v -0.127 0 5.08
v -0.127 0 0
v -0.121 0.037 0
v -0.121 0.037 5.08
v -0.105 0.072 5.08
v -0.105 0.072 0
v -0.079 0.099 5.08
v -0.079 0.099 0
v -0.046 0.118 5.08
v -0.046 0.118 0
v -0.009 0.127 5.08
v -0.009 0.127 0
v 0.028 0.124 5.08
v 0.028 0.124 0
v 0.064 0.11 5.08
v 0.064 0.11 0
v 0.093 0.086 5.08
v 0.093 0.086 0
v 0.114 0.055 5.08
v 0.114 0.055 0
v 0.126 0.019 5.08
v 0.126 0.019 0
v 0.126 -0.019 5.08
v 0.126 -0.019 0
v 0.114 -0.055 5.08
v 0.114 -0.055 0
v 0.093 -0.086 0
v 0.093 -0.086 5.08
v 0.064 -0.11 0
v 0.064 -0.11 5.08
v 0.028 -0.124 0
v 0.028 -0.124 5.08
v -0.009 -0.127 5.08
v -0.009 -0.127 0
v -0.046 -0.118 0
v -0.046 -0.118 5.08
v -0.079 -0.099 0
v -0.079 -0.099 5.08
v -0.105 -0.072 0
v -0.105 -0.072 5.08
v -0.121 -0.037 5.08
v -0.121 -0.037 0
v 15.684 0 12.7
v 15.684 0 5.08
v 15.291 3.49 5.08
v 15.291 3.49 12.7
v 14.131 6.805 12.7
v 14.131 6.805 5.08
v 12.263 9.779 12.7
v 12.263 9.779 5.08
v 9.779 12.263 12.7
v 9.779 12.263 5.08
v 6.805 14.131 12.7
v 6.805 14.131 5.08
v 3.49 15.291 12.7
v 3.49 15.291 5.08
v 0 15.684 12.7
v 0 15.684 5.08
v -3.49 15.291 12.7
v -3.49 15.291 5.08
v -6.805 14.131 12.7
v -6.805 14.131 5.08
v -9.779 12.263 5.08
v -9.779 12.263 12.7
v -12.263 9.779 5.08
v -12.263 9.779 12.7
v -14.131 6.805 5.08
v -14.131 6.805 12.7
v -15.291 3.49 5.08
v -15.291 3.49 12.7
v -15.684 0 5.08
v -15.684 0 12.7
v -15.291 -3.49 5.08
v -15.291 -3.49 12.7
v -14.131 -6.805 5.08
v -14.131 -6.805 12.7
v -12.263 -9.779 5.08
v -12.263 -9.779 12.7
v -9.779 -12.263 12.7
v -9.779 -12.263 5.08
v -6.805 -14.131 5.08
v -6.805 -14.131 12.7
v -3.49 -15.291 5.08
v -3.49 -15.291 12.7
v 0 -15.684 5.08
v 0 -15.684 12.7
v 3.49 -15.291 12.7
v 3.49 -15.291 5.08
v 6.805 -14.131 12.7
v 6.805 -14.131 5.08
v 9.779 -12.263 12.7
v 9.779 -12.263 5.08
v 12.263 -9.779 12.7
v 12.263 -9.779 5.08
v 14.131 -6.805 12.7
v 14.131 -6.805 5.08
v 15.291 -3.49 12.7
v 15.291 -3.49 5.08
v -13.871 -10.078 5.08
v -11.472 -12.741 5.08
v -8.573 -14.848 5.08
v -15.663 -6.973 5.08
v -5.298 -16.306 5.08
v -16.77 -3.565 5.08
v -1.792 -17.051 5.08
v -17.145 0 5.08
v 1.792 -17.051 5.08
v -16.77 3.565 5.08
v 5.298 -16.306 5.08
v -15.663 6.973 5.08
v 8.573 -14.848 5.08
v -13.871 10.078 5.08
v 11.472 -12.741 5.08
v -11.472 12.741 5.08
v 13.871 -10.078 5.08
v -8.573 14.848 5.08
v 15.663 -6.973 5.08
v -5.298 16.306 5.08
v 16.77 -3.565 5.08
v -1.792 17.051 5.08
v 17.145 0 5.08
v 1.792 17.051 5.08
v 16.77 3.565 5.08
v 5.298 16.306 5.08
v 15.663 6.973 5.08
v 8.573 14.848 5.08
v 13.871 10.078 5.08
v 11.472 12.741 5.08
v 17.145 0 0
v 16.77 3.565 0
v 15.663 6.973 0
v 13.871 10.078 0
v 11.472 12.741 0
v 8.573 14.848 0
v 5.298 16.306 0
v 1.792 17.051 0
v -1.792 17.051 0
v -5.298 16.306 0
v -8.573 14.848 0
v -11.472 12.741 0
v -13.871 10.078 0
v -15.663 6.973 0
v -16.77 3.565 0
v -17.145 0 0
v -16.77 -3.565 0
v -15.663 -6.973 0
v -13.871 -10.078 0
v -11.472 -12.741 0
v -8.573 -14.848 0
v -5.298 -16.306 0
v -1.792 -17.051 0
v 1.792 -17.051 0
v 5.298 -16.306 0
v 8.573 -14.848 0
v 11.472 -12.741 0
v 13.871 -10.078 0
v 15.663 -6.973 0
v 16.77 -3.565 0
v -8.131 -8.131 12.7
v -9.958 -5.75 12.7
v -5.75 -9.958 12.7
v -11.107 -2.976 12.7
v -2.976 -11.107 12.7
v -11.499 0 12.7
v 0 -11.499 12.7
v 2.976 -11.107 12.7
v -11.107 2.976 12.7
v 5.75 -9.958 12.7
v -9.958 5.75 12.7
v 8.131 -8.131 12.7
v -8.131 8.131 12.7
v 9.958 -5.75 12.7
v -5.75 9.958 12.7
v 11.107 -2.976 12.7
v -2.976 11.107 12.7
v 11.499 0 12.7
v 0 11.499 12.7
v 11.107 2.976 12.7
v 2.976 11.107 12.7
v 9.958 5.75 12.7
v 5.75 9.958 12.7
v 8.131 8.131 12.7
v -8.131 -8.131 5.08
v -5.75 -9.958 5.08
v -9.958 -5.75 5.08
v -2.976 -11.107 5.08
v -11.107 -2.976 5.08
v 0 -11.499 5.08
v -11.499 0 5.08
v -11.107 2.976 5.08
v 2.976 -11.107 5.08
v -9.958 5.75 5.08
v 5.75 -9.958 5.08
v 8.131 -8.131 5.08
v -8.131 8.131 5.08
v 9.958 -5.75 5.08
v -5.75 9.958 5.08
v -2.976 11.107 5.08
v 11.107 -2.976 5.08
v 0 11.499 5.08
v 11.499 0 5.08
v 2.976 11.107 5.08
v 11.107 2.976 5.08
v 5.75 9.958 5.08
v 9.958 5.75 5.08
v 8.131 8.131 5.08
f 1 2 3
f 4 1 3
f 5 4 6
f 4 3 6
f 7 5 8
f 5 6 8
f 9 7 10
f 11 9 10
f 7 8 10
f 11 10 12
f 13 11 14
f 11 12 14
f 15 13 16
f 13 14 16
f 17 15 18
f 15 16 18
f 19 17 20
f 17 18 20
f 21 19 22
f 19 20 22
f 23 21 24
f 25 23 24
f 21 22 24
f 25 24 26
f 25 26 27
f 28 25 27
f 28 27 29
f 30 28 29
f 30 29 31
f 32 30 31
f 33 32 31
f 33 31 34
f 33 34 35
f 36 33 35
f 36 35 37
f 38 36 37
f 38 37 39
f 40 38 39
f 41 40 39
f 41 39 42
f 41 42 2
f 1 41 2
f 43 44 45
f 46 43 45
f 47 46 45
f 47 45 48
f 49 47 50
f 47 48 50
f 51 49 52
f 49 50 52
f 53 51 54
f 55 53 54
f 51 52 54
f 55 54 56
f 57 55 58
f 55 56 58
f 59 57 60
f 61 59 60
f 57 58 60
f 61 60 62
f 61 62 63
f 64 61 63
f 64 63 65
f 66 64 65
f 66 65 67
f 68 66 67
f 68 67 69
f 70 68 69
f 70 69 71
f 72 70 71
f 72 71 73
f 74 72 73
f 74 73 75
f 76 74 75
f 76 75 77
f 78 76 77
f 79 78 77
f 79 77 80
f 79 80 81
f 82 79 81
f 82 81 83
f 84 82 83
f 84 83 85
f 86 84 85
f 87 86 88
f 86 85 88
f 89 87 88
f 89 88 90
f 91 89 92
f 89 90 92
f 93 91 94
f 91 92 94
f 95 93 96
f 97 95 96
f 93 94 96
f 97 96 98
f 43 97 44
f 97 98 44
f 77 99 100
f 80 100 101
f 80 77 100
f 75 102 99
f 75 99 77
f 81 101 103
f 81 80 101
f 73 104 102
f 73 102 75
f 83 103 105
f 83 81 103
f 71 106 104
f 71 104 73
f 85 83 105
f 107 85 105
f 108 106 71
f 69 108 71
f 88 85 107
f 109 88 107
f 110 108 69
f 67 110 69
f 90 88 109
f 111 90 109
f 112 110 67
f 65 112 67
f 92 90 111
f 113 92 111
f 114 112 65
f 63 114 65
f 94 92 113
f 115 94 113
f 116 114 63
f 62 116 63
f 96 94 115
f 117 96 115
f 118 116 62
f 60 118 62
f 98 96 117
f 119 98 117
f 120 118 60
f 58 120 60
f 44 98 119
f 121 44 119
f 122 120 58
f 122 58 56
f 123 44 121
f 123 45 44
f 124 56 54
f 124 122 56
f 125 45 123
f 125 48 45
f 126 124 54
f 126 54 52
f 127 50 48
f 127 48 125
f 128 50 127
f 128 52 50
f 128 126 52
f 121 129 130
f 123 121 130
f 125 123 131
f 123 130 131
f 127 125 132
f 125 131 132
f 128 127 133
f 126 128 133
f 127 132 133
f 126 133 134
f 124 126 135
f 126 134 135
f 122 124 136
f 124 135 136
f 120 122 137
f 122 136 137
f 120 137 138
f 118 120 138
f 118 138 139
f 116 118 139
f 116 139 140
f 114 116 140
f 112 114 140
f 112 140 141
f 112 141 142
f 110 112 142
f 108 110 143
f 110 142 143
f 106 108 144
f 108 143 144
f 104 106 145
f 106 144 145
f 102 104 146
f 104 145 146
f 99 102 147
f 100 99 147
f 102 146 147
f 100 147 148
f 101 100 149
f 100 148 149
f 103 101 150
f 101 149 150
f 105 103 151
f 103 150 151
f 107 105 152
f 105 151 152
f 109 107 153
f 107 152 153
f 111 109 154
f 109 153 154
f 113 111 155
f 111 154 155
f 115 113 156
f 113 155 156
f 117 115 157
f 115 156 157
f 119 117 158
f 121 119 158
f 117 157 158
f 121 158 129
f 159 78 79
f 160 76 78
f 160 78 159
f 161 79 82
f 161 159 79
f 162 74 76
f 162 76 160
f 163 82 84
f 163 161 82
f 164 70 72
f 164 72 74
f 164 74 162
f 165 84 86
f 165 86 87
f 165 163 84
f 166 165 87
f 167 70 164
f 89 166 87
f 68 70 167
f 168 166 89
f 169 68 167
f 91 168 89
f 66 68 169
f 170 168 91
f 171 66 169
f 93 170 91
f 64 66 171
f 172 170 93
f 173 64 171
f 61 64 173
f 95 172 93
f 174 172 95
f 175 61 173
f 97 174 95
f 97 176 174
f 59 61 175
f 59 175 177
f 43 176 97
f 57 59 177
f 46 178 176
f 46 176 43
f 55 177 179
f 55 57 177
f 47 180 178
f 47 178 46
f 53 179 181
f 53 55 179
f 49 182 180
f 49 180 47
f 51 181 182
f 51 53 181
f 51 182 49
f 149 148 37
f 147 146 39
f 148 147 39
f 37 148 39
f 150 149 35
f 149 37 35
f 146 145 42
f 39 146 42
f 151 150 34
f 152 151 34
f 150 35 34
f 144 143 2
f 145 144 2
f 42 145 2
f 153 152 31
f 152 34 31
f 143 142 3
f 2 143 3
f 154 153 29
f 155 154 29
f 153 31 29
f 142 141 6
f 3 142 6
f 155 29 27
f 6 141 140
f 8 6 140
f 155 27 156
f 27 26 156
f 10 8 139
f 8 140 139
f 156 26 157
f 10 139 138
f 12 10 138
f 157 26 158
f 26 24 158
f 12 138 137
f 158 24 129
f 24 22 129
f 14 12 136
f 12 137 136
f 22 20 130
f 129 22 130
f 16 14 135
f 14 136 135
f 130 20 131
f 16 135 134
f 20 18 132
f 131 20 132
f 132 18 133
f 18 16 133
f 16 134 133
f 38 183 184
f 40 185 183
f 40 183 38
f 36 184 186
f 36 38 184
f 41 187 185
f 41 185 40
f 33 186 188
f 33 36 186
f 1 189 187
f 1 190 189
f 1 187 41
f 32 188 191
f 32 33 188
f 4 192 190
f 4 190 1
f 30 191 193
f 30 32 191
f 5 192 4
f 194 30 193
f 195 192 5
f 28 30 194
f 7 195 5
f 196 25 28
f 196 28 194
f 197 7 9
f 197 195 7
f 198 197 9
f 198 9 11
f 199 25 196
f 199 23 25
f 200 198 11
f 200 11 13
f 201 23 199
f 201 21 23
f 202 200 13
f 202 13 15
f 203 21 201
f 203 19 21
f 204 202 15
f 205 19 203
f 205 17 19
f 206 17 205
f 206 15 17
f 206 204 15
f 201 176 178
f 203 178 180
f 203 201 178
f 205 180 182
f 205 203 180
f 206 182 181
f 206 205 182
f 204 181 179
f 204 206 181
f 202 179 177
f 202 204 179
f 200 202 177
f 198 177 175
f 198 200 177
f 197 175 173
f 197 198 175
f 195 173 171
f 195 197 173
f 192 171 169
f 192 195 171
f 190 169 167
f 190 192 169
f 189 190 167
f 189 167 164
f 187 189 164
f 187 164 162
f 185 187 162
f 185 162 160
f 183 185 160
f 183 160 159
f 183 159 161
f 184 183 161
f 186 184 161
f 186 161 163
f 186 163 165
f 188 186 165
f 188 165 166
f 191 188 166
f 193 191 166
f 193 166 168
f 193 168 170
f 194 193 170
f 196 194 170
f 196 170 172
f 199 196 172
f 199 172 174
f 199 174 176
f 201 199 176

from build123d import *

# Parameters (mm, degrees)
F0_R     = 15.6845
F0_R_2   = 11.499076
F1_DEPTH = 12.7
F2_R     = 17.145
F3_DEPTH = 5.08
F5_D     = 0.254


with BuildPart() as f1:
    # F0 (on Top) → F1 (new body)
    with BuildSketch(Plane.XY):
        Circle(F0_R)
        Circle(F0_R_2, mode=Mode.SUBTRACT)
    extrude(amount=F1_DEPTH)

    # F2 (on Top) → F3 (join)
    with BuildSketch(Plane.XY):
        Circle(F2_R)
    extrude(amount=F3_DEPTH)

    # F5 (through all)
    with Locations(Plane.XY.offset(5.08)):
        with Locations((0, 0)):
            Hole(F5_D / 2)


solid = f1.part
